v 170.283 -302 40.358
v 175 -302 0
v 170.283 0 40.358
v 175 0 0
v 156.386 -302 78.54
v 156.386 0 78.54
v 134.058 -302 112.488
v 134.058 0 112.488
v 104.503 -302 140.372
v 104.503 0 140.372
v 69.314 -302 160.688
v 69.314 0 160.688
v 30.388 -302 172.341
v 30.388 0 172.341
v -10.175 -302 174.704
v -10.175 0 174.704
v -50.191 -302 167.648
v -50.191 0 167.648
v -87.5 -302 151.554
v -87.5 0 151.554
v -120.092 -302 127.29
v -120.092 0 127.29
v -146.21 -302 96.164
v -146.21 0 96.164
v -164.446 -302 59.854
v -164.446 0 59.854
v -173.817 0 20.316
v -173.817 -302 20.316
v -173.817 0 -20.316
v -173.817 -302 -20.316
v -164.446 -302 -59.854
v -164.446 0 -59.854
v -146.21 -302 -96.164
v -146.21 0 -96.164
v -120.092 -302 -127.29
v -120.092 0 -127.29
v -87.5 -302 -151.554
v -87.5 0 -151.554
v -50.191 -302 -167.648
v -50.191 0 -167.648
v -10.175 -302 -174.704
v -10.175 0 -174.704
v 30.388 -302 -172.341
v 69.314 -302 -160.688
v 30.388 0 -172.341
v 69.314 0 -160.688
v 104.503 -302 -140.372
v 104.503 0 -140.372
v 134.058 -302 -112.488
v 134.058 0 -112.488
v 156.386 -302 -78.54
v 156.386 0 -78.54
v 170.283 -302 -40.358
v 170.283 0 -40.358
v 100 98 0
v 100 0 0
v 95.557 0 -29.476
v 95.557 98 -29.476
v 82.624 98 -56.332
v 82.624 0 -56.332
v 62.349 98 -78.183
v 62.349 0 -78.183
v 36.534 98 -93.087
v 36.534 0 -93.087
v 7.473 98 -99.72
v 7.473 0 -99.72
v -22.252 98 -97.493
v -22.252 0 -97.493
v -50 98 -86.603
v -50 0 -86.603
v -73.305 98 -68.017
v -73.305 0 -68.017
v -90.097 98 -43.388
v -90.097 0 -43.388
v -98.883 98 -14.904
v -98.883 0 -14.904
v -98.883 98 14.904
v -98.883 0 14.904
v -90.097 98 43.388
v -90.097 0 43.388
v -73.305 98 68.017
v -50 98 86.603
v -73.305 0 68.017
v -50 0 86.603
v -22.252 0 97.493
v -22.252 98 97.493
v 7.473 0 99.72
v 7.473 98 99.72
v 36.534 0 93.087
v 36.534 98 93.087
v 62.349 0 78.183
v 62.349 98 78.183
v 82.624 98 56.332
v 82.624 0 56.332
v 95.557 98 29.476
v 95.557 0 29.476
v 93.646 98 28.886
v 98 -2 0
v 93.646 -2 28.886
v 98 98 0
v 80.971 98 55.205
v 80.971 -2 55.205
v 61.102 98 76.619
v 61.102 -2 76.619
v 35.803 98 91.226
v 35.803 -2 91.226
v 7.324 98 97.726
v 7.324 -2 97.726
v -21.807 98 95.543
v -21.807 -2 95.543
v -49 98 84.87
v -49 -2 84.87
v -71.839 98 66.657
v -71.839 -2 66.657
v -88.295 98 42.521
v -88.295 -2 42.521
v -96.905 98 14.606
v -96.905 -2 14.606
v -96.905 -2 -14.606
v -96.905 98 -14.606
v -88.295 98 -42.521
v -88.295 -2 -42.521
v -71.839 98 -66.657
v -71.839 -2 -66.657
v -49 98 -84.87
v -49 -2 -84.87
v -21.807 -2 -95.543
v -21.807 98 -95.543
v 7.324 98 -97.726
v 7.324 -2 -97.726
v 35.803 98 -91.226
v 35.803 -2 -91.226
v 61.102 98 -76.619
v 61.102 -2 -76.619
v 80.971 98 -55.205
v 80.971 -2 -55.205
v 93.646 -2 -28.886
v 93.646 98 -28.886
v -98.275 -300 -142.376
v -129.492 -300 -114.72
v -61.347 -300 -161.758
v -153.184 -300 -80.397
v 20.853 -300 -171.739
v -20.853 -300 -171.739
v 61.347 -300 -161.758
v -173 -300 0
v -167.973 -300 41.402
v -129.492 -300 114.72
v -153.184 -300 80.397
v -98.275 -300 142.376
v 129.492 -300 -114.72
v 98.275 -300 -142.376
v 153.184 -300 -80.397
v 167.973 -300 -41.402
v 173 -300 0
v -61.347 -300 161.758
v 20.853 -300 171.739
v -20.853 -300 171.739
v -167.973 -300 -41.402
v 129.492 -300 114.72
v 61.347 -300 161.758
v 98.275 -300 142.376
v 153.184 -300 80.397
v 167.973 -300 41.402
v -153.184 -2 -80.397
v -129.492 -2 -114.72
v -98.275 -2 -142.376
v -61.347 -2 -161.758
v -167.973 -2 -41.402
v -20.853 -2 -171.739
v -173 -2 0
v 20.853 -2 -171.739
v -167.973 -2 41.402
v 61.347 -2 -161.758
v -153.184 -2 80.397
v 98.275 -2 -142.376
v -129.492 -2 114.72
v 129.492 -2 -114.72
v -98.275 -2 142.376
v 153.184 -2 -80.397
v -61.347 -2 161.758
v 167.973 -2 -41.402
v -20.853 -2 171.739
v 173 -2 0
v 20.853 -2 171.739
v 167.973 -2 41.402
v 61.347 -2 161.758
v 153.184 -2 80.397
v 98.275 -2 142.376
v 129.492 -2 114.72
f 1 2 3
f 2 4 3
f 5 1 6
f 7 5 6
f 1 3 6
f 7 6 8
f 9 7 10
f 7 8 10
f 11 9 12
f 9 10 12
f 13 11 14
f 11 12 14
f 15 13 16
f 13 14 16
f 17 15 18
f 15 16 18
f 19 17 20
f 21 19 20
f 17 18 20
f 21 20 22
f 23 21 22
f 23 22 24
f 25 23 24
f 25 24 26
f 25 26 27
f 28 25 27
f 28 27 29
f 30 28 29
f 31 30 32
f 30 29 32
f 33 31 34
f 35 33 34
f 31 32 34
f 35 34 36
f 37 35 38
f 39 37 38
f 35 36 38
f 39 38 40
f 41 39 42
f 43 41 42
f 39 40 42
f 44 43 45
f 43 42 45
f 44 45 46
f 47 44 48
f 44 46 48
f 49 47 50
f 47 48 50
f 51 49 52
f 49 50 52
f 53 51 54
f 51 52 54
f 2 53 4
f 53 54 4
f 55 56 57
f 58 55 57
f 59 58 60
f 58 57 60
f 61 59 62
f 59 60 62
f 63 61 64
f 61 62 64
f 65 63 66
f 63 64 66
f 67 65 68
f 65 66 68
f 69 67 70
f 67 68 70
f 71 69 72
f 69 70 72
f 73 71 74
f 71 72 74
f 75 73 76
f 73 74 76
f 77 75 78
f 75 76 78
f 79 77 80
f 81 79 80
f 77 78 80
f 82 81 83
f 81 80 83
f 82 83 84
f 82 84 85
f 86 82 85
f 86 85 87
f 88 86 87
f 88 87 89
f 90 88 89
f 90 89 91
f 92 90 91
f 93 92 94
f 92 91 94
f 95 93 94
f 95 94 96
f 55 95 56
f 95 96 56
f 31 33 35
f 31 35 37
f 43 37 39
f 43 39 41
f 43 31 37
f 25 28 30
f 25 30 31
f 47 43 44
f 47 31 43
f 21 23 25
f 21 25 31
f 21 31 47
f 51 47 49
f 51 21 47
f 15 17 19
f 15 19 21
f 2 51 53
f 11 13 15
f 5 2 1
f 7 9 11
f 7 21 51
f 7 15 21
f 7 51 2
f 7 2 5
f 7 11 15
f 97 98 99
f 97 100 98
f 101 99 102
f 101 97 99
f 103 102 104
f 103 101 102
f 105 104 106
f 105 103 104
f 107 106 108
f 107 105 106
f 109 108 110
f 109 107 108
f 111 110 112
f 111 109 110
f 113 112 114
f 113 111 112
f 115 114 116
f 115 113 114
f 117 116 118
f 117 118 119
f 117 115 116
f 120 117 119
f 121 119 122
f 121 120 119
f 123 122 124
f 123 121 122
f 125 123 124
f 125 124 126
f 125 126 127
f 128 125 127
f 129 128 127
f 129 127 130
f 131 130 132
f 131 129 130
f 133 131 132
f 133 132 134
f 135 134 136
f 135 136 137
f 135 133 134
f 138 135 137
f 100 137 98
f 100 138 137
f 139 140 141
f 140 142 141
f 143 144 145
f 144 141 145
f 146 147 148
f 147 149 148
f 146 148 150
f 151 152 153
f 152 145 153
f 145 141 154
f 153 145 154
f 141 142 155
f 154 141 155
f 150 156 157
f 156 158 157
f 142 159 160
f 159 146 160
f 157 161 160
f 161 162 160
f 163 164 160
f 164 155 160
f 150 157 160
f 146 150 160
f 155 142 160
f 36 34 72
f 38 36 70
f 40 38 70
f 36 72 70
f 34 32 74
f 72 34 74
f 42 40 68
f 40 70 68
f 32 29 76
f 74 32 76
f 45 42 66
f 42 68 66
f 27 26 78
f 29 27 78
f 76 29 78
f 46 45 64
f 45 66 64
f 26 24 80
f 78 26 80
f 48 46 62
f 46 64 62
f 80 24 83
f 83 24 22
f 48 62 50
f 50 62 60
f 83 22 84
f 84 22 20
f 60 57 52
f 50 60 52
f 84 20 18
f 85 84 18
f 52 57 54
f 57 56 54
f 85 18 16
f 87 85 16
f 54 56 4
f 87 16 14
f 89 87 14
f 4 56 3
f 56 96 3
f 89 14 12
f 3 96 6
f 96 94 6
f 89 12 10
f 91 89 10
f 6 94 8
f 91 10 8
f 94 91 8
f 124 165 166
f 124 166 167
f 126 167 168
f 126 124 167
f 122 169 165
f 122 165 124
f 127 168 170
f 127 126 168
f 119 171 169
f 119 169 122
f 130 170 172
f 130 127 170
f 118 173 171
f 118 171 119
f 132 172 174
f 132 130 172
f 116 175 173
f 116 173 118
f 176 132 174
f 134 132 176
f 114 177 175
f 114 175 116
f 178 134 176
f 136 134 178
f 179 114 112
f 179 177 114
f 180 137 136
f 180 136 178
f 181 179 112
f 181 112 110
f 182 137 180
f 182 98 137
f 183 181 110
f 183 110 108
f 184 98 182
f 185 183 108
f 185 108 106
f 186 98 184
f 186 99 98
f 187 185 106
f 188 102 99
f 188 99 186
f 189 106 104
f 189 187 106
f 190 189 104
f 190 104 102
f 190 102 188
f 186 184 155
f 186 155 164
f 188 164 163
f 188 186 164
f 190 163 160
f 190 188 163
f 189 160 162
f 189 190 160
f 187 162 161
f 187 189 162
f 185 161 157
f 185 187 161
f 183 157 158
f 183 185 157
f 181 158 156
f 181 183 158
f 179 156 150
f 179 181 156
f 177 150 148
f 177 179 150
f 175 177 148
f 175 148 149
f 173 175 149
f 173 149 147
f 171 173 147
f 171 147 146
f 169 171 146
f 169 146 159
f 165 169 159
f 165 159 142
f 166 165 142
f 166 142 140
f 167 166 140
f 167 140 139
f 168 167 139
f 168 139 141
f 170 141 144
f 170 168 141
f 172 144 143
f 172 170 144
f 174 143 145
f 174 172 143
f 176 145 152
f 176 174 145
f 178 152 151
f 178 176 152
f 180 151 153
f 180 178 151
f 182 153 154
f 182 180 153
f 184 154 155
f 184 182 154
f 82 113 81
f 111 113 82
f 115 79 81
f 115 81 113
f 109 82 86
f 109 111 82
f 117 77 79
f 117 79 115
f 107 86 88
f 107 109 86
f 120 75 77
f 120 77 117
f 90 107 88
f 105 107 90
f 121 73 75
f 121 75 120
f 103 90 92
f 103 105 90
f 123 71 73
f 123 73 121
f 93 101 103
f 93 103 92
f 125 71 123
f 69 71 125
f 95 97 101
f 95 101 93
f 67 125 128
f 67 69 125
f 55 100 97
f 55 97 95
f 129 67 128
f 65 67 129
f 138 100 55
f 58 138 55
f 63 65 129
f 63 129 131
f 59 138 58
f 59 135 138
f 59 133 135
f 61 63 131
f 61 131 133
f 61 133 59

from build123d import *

# Parameters (mm, degrees)
SKETCH1_R           = 100
BOSS_EXTRUDE1_DEPTH = 98
SKETCH3_R           = 98
CUT_EXTRUDE2_DEPTH  = 397
SKETCH5_R           = 175
SKETCH5_R_2         = 98
BOSS_EXTRUDE2_DEPTH = 2
SKETCH7_R           = 175
SKETCH7_R_2         = 173
BOSS_EXTRUDE3_DEPTH = 300
SKETCH8_R           = 175
BOSS_EXTRUDE4_DEPTH = 2


with BuildPart() as part:
    # Sketch1 → Boss-Extrude1 (new body)
    with BuildSketch(Plane(origin=(0, 0, 0), x_dir=(1, 0, 0), z_dir=(0, 1, 0))):
        Circle(SKETCH1_R)
    extrude(amount=BOSS_EXTRUDE1_DEPTH)

    # Sketch3 → Cut-Extrude2 (cut)
    with BuildSketch(Plane(origin=(0, 98, 0), x_dir=(1, 0, 0), z_dir=(0, 1, 0))):
        Circle(SKETCH3_R)
    extrude(amount=-CUT_EXTRUDE2_DEPTH, mode=Mode.SUBTRACT)

    # Sketch5 → Boss-Extrude2 (add)
    with BuildSketch(Plane.XZ):
        Circle(SKETCH5_R)
        Circle(SKETCH5_R_2, mode=Mode.SUBTRACT)
    extrude(amount=BOSS_EXTRUDE2_DEPTH)

    # Sketch7 → Boss-Extrude3 (add)
    with BuildSketch(Plane.XZ.offset(2)):
        Circle(SKETCH7_R)
        Circle(SKETCH7_R_2, mode=Mode.SUBTRACT)
    extrude(amount=BOSS_EXTRUDE3_DEPTH)

    # Sketch8 → Boss-Extrude4 (add)
    with BuildSketch(Plane.XZ.offset(302)):
        Circle(SKETCH8_R)
    extrude(amount=-BOSS_EXTRUDE4_DEPTH)


solid = part.part
